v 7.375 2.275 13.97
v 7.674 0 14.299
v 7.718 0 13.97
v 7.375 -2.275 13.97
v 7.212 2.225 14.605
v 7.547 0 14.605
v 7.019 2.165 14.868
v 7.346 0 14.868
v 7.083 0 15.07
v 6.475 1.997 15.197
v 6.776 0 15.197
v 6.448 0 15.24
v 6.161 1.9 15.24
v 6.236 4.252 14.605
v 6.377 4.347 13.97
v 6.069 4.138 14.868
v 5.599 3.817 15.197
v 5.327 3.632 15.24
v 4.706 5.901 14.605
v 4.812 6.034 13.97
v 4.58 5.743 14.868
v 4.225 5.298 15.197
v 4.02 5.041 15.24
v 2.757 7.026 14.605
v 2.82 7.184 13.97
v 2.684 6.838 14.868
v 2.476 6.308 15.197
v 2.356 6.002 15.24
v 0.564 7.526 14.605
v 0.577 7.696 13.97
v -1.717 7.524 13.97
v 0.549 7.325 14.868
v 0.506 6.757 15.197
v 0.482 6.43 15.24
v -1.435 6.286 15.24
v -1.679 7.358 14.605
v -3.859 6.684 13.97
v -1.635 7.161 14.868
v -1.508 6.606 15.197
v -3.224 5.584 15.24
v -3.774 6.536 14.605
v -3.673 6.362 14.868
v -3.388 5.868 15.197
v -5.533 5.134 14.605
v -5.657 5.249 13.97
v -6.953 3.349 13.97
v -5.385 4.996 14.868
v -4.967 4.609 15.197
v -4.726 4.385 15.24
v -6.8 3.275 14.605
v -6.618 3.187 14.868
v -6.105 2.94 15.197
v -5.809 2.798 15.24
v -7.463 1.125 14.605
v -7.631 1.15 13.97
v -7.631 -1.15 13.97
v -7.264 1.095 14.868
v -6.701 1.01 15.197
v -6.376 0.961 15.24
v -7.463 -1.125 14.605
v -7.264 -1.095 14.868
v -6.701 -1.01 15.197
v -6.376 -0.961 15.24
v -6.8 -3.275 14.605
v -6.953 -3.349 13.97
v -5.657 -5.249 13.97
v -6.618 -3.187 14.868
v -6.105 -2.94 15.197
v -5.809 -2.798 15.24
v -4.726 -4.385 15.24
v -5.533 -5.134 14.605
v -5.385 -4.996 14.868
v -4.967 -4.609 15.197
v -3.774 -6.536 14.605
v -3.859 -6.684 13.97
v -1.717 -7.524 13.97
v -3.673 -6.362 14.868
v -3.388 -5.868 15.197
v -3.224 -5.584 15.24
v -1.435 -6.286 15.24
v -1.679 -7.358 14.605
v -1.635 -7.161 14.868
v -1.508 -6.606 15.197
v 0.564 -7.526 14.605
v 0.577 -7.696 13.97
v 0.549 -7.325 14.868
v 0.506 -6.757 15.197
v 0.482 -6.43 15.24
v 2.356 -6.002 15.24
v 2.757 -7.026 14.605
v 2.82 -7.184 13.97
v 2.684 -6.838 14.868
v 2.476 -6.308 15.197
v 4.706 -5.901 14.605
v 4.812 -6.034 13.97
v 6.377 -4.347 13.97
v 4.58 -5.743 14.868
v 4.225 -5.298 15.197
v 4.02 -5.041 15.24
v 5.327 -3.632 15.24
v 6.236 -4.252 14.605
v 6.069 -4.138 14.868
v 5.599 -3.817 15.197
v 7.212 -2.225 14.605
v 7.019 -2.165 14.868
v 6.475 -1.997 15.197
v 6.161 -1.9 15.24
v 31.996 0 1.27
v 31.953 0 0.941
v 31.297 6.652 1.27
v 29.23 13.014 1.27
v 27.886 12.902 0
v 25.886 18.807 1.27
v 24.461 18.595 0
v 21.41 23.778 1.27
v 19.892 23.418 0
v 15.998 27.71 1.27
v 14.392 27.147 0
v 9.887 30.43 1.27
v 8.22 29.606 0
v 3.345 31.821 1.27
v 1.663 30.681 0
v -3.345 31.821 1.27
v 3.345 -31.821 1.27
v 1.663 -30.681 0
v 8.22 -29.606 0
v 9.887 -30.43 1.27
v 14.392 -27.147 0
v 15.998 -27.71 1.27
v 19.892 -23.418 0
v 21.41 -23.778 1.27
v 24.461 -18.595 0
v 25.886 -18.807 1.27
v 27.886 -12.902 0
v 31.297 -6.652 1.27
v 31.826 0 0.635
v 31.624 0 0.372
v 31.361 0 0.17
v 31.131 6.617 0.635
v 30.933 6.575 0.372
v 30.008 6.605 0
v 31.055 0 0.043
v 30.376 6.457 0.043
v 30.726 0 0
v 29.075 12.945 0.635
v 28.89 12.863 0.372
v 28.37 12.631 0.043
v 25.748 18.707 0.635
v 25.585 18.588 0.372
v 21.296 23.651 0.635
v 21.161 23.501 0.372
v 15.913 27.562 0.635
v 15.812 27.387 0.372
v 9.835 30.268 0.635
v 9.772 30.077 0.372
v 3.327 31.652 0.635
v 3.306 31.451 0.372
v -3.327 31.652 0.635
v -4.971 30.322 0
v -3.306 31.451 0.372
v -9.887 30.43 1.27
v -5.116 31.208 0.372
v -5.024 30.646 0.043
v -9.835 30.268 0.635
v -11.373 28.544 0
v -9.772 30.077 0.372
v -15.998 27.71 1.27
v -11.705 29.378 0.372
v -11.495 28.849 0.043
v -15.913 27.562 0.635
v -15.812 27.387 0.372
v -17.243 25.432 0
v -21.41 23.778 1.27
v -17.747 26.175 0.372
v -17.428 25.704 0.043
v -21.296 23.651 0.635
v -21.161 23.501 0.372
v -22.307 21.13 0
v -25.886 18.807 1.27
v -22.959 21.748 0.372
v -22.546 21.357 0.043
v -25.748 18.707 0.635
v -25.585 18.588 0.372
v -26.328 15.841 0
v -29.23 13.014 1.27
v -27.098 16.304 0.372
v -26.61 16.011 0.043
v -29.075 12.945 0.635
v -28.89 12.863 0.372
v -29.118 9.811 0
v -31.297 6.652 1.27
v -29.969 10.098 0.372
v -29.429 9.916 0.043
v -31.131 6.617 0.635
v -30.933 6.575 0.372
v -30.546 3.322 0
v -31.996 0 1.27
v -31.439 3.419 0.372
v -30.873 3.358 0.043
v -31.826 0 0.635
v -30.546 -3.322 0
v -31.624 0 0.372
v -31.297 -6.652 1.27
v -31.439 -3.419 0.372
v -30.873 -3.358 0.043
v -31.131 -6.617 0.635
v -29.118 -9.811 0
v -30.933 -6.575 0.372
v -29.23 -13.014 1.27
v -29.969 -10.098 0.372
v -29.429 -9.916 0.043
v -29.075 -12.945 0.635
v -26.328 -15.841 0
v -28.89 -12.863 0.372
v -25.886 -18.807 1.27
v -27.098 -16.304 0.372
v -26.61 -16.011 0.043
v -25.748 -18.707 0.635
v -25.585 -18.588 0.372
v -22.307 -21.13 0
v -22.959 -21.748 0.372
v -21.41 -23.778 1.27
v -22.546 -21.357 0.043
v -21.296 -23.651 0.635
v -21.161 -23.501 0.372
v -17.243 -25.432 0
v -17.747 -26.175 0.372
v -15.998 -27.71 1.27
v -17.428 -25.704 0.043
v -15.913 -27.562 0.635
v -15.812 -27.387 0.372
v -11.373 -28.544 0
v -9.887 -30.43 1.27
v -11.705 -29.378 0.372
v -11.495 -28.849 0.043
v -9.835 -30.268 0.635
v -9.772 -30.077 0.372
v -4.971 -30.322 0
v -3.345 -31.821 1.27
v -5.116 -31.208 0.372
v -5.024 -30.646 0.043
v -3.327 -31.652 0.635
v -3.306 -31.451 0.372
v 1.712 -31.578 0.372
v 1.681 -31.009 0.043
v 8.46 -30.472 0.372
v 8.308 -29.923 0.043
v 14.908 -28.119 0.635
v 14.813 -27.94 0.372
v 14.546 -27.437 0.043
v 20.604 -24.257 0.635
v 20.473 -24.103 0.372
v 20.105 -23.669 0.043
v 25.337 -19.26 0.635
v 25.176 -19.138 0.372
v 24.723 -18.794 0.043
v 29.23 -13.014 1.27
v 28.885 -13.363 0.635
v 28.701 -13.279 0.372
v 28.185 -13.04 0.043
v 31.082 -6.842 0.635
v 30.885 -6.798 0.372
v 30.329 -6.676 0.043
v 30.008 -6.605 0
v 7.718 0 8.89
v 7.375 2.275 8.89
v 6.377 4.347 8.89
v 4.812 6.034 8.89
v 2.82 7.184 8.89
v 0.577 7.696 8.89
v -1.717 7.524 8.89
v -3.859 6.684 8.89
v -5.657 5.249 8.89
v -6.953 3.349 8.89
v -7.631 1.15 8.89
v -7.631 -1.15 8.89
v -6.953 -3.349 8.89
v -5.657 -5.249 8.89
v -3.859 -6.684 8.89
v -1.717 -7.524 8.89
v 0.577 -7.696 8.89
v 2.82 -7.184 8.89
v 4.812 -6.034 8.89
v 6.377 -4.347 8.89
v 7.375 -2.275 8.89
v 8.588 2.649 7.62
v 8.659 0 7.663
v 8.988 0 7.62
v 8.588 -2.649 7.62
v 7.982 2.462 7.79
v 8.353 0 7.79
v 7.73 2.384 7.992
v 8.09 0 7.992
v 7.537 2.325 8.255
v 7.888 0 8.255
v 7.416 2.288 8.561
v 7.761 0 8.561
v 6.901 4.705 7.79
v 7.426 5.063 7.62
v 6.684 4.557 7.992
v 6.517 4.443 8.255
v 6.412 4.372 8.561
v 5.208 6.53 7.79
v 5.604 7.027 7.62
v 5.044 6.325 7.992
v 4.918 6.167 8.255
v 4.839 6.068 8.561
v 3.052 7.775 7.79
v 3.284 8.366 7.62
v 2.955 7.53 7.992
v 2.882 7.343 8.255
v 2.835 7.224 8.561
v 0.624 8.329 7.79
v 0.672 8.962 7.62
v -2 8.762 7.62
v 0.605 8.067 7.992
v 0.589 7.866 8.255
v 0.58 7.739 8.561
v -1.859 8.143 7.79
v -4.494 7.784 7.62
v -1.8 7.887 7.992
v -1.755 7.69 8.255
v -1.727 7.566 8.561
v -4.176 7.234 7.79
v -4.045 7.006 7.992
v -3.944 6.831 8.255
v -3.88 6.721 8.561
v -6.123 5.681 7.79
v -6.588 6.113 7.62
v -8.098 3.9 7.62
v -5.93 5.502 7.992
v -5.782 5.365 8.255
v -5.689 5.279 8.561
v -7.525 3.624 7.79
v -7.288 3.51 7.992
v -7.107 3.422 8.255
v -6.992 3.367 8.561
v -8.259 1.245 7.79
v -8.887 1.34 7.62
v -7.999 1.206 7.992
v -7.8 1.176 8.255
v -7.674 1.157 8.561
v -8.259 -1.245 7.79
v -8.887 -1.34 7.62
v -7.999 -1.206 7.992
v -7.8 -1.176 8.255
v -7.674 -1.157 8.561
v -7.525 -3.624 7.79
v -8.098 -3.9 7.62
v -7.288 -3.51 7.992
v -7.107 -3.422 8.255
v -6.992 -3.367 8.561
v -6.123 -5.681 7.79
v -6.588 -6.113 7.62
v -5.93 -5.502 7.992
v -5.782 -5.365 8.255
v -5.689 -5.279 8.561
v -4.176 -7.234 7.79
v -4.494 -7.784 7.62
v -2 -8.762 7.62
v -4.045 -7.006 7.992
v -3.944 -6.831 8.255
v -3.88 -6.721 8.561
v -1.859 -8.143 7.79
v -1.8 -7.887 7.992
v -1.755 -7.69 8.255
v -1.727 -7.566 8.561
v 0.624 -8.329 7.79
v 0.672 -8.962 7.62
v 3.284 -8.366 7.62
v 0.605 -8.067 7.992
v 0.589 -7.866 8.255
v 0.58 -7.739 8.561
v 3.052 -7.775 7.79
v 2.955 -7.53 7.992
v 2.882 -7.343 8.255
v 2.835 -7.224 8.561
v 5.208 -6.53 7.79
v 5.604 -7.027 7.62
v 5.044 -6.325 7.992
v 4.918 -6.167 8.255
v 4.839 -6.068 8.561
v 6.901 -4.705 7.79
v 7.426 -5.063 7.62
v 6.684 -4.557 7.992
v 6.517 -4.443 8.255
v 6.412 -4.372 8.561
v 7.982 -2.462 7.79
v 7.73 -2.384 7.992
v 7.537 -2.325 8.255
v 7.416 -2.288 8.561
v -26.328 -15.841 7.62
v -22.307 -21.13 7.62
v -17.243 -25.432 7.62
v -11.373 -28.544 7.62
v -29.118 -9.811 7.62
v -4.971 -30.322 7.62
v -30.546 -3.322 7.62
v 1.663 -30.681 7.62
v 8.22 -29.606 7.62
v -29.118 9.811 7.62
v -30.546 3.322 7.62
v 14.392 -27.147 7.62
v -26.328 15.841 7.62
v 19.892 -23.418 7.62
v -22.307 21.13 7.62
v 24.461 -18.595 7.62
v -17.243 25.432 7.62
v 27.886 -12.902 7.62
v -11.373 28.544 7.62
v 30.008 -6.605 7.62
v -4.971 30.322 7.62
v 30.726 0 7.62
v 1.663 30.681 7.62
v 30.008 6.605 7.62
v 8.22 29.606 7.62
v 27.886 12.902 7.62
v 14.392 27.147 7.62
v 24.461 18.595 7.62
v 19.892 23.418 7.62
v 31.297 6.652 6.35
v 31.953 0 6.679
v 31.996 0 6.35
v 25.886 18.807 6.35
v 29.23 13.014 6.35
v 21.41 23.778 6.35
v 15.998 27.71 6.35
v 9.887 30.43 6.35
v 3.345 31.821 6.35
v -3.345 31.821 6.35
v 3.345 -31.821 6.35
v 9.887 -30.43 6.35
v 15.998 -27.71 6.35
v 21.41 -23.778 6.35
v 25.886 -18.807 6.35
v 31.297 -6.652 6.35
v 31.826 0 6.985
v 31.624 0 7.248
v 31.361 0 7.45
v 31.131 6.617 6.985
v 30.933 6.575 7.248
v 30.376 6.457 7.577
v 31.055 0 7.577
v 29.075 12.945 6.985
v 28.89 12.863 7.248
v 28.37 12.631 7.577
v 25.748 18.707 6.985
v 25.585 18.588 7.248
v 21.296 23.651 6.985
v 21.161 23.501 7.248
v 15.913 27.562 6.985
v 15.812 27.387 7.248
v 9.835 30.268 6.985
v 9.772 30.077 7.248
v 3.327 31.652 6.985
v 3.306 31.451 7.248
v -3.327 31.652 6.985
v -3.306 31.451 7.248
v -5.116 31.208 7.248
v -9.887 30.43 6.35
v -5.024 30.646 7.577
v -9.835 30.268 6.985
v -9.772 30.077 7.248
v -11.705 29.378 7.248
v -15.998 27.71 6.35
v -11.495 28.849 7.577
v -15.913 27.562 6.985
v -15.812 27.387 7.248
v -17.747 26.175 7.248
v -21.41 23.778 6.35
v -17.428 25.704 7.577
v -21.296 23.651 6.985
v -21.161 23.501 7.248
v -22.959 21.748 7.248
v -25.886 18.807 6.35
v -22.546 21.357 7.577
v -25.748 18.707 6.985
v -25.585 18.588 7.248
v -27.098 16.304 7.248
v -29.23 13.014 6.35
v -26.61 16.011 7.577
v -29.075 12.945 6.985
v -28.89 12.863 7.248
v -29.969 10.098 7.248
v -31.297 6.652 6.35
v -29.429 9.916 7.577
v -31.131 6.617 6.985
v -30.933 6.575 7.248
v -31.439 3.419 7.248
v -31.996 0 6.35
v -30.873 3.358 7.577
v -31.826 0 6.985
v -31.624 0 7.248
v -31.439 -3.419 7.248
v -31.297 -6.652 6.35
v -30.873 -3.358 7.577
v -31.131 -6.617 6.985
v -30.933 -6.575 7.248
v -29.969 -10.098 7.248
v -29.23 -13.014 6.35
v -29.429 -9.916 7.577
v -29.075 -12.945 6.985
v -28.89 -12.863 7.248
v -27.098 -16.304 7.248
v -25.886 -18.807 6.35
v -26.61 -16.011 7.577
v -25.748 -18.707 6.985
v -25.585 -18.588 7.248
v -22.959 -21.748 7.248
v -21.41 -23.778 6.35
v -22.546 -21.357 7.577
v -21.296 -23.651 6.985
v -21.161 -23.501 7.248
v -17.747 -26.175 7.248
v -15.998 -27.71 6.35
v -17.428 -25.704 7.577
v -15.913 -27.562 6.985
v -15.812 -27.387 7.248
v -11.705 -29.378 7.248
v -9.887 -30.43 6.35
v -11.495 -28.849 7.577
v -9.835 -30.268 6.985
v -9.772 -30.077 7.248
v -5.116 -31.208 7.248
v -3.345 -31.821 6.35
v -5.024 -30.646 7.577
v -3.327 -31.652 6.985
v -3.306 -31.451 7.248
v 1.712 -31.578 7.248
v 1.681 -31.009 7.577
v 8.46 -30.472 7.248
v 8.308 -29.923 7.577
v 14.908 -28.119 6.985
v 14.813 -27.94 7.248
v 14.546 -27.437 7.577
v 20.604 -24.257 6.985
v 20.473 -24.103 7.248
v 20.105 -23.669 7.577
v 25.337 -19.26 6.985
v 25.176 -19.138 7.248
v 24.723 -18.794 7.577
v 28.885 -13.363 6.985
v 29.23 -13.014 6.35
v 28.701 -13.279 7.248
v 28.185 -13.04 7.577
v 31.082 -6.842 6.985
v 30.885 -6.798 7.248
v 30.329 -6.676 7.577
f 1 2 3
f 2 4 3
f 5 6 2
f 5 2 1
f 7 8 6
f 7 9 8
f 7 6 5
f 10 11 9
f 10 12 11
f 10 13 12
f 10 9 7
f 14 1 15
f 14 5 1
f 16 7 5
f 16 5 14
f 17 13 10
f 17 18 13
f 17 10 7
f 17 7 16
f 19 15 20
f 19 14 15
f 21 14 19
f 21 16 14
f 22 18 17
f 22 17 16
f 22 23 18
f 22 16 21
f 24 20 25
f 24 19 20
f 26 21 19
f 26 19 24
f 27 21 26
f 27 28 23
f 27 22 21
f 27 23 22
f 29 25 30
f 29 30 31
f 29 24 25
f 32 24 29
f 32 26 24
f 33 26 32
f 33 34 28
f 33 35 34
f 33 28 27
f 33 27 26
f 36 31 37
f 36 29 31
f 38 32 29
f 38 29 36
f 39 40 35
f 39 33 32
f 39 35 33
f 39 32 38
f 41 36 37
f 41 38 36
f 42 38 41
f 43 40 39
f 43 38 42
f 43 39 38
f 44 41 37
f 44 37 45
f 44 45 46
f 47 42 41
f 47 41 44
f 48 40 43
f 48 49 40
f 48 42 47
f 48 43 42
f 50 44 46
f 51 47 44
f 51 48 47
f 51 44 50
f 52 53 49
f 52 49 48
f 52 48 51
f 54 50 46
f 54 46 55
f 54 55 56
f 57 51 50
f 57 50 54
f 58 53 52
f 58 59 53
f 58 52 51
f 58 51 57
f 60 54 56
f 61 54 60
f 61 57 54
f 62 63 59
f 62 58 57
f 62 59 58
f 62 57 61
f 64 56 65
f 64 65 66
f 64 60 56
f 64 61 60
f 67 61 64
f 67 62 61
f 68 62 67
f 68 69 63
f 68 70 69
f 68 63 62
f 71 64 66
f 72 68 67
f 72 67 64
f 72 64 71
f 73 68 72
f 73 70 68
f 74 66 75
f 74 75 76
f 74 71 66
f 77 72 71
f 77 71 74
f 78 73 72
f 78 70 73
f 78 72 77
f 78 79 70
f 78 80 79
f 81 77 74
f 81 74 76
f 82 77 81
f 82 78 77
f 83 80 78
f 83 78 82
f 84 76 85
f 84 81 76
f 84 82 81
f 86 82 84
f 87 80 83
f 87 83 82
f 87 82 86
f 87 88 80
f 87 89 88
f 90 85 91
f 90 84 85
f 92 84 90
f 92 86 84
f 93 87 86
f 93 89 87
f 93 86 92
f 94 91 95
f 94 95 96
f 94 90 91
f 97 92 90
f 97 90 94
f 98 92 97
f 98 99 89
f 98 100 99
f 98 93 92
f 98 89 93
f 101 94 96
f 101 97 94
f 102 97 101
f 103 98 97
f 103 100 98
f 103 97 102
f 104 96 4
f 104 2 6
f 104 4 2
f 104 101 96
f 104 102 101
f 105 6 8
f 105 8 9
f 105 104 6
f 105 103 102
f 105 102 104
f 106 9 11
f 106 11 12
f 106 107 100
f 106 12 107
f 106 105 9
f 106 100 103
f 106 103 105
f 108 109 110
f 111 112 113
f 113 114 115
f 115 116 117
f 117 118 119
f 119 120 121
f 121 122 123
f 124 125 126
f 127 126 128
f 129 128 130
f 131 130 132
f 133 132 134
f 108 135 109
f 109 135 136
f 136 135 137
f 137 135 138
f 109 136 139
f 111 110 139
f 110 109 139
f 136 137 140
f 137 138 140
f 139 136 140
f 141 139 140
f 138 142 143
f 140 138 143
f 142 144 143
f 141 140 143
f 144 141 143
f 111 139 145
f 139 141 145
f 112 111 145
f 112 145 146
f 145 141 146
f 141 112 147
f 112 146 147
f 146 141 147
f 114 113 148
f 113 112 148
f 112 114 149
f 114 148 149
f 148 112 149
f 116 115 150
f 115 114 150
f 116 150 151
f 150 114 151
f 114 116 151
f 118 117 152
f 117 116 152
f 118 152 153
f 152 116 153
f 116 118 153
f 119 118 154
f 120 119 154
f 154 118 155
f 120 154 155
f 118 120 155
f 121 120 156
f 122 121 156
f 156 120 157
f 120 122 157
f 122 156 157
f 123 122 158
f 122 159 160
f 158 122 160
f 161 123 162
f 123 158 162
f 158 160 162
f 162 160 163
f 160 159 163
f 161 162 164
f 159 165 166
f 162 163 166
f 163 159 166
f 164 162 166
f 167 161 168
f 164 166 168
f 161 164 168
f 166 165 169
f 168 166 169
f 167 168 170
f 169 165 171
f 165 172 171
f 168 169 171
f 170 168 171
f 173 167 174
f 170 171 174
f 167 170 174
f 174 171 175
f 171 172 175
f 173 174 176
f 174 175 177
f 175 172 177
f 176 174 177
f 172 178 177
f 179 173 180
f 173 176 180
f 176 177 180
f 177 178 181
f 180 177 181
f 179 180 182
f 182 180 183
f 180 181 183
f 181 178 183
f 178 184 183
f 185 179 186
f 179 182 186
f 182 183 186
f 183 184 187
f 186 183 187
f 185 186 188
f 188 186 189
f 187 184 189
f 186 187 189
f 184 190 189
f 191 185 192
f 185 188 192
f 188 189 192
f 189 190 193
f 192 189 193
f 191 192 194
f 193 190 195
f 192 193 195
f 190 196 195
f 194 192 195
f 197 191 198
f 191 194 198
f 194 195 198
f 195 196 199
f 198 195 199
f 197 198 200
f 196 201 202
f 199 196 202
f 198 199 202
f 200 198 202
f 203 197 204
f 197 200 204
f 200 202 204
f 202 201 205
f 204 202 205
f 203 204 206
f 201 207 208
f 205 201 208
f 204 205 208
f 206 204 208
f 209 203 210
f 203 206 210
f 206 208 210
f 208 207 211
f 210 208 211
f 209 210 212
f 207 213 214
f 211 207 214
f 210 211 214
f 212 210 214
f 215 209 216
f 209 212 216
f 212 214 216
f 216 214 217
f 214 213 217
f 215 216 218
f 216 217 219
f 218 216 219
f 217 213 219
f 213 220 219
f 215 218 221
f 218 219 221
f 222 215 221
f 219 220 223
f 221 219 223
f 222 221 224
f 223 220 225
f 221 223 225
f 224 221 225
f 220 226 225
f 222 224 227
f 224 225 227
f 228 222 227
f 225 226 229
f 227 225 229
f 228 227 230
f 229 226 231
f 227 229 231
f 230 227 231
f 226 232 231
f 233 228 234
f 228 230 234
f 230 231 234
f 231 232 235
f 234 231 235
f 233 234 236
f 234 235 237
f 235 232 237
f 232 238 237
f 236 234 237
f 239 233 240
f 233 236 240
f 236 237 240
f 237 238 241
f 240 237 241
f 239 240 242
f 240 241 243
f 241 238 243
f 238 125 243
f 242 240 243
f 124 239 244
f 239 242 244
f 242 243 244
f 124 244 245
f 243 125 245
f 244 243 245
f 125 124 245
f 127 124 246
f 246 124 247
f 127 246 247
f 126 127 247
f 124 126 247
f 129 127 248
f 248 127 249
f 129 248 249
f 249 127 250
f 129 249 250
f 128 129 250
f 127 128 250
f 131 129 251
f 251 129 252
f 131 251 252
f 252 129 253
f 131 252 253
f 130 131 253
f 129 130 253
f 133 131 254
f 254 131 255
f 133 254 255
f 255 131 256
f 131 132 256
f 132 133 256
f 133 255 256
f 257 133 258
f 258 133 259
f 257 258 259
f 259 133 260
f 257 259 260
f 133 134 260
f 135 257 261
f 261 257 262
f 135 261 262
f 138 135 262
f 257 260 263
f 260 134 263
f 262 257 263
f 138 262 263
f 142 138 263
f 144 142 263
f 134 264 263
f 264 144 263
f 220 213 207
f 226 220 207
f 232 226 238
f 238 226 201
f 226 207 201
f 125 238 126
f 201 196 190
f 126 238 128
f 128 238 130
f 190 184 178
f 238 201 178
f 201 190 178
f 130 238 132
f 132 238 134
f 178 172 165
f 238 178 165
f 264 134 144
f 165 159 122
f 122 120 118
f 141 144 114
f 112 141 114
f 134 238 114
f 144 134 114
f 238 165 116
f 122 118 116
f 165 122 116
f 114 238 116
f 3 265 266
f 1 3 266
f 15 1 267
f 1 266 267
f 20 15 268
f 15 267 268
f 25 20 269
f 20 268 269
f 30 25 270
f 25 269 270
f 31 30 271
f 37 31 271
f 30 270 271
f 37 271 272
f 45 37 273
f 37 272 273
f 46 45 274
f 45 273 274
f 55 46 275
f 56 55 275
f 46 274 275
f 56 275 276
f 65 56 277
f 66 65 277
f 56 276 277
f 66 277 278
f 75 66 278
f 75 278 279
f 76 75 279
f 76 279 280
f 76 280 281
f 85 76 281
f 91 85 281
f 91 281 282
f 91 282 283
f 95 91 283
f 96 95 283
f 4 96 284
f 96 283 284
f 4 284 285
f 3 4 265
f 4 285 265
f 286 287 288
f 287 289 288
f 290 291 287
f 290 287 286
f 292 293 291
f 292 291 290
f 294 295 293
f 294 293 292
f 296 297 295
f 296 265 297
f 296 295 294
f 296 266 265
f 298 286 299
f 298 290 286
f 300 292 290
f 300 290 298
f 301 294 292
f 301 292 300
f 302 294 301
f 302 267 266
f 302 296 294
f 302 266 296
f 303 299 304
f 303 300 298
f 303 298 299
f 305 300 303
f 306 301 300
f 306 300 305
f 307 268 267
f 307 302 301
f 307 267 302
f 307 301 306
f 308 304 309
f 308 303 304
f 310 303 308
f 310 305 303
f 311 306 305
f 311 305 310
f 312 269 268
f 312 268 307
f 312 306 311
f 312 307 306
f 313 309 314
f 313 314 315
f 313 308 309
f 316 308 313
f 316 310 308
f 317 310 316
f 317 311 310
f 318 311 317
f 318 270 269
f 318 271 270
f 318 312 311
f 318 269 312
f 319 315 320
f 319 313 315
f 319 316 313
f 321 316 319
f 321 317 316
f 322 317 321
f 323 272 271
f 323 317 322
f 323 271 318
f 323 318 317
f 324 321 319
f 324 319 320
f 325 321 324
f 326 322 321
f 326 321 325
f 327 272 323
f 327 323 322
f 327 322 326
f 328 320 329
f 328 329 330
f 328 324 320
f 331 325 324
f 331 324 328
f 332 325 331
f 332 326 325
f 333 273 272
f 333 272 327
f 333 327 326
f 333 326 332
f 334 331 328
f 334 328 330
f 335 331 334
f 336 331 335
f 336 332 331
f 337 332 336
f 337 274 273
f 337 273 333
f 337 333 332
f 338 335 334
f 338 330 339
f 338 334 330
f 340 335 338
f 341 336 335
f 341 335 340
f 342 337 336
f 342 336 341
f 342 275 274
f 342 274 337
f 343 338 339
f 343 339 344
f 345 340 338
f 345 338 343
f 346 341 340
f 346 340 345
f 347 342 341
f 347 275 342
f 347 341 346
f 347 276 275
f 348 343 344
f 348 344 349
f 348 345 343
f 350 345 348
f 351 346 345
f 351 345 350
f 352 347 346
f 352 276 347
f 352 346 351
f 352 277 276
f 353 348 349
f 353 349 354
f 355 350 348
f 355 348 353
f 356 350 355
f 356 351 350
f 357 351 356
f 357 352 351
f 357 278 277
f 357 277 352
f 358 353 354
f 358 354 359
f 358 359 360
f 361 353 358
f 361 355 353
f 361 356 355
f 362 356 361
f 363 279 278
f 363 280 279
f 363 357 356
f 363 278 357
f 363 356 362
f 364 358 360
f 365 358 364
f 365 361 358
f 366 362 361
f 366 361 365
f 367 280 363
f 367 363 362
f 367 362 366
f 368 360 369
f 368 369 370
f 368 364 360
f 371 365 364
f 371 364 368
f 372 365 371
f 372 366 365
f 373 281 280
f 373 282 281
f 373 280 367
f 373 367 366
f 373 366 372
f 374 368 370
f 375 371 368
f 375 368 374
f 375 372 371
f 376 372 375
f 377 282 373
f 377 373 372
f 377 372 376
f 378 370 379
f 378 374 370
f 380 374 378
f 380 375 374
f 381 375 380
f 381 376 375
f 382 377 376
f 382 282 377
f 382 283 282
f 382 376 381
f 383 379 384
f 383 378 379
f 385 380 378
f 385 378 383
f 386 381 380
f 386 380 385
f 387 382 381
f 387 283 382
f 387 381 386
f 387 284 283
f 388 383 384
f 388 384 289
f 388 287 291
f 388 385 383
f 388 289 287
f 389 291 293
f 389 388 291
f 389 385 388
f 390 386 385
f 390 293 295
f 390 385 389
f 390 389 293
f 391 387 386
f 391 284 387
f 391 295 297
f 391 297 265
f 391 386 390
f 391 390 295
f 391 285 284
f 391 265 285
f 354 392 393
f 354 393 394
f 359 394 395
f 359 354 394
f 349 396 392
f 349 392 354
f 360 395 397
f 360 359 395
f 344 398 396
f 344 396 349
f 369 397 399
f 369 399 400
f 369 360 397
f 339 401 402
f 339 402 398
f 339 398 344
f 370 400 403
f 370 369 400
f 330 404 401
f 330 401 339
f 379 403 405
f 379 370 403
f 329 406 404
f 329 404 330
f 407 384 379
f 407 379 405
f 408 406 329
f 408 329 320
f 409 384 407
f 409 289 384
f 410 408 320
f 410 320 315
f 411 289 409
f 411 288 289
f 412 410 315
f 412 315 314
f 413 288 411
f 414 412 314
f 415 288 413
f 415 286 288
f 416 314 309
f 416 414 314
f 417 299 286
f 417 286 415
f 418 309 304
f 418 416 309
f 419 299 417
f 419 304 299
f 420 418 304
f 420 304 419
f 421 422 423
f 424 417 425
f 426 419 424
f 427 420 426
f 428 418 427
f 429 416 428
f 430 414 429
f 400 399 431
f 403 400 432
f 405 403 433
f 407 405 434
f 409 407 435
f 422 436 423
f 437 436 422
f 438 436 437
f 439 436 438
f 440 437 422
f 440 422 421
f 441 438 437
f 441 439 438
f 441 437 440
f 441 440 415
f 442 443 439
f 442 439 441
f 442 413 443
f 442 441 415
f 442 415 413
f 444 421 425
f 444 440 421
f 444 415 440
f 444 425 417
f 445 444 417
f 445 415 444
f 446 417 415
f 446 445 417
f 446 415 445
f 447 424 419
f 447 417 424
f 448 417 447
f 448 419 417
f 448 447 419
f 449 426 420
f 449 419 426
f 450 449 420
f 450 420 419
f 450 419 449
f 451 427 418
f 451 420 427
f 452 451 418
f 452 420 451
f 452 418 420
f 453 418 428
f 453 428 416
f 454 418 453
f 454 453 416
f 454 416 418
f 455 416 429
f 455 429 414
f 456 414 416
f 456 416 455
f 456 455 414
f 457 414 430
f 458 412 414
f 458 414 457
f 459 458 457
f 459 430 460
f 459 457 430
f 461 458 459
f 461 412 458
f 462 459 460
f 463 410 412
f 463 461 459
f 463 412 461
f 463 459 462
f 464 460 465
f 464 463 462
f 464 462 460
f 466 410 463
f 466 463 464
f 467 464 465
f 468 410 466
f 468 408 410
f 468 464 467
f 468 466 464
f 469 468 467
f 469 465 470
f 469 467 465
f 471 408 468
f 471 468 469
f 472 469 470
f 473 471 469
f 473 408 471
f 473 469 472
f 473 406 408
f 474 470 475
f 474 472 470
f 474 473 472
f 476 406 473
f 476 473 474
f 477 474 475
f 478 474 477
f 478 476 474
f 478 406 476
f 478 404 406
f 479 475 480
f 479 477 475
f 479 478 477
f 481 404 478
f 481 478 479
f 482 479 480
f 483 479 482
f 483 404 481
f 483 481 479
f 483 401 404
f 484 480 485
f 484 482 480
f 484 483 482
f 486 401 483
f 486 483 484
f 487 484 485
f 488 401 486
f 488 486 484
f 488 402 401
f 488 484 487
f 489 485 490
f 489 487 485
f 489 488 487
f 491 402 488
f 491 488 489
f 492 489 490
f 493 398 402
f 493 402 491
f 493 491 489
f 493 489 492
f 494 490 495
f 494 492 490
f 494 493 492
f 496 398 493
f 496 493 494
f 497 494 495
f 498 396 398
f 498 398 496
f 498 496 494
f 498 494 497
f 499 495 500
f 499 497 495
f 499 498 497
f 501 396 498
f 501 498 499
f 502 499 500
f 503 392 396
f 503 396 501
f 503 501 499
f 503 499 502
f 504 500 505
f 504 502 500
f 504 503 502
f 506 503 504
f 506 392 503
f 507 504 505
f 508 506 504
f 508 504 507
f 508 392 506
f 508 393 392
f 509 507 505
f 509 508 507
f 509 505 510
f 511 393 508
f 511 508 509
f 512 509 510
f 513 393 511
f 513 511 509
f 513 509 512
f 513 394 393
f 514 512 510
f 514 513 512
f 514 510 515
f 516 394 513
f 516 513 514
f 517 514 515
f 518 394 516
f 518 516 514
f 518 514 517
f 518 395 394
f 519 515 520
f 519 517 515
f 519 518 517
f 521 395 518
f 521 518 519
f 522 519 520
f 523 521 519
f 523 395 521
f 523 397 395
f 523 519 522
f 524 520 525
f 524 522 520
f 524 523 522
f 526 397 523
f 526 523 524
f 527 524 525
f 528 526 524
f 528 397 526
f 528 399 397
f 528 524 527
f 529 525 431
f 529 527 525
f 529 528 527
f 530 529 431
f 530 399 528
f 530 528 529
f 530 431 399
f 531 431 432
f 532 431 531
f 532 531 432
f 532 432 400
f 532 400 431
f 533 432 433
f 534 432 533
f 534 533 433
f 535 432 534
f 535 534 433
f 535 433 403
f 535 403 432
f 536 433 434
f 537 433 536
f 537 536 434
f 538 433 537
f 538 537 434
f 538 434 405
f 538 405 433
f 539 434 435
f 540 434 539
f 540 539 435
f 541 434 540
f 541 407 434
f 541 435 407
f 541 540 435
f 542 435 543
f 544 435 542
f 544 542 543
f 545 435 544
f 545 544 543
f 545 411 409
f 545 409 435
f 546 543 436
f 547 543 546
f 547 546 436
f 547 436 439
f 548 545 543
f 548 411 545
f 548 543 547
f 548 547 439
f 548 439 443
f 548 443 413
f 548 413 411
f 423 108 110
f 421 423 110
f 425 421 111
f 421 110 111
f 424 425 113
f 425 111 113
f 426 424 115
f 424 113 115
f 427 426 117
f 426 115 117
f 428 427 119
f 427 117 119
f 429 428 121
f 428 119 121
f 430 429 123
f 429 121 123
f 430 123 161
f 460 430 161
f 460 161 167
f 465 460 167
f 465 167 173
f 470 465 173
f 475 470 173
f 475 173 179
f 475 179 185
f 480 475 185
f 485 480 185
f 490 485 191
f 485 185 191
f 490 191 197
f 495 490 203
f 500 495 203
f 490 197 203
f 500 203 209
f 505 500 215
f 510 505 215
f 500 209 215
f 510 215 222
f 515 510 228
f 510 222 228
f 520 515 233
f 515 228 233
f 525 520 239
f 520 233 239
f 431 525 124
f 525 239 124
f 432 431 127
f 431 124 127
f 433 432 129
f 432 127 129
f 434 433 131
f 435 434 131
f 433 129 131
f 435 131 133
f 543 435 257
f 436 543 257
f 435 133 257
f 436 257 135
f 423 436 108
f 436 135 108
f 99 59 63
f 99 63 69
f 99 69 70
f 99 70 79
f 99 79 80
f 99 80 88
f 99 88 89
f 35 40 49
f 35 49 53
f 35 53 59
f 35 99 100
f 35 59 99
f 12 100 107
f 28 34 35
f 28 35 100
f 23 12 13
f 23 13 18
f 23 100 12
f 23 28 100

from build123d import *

# Parameters (mm, degrees)
F0_R     = 31.996319
F1_DEPTH = 7.62
F2_R     = 7.717623
F3_DEPTH = 7.62
F4_R     = 1.27


with BuildPart() as f1:
    # F0 (on Top) → F1 (new body)
    with BuildSketch(Plane.XY):
        Circle(F0_R)
    extrude(amount=F1_DEPTH)

    # F2 (on face) → F3 (join)
    with BuildSketch(Plane.XY.offset(7.62)):
        Circle(F2_R)
    extrude(amount=F3_DEPTH)

    # F4
    f4_edges = [f1.edges().sort_by_distance(p)[0] for p in [
        (-7.717623, 0, 15.24),
        (-31.996319, 0, 7.62),
        (-7.717623, 0, 7.62),
        (-31.996319, 0, 0),
    ]]
    fillet(f4_edges, radius=F4_R)


solid = f1.part
